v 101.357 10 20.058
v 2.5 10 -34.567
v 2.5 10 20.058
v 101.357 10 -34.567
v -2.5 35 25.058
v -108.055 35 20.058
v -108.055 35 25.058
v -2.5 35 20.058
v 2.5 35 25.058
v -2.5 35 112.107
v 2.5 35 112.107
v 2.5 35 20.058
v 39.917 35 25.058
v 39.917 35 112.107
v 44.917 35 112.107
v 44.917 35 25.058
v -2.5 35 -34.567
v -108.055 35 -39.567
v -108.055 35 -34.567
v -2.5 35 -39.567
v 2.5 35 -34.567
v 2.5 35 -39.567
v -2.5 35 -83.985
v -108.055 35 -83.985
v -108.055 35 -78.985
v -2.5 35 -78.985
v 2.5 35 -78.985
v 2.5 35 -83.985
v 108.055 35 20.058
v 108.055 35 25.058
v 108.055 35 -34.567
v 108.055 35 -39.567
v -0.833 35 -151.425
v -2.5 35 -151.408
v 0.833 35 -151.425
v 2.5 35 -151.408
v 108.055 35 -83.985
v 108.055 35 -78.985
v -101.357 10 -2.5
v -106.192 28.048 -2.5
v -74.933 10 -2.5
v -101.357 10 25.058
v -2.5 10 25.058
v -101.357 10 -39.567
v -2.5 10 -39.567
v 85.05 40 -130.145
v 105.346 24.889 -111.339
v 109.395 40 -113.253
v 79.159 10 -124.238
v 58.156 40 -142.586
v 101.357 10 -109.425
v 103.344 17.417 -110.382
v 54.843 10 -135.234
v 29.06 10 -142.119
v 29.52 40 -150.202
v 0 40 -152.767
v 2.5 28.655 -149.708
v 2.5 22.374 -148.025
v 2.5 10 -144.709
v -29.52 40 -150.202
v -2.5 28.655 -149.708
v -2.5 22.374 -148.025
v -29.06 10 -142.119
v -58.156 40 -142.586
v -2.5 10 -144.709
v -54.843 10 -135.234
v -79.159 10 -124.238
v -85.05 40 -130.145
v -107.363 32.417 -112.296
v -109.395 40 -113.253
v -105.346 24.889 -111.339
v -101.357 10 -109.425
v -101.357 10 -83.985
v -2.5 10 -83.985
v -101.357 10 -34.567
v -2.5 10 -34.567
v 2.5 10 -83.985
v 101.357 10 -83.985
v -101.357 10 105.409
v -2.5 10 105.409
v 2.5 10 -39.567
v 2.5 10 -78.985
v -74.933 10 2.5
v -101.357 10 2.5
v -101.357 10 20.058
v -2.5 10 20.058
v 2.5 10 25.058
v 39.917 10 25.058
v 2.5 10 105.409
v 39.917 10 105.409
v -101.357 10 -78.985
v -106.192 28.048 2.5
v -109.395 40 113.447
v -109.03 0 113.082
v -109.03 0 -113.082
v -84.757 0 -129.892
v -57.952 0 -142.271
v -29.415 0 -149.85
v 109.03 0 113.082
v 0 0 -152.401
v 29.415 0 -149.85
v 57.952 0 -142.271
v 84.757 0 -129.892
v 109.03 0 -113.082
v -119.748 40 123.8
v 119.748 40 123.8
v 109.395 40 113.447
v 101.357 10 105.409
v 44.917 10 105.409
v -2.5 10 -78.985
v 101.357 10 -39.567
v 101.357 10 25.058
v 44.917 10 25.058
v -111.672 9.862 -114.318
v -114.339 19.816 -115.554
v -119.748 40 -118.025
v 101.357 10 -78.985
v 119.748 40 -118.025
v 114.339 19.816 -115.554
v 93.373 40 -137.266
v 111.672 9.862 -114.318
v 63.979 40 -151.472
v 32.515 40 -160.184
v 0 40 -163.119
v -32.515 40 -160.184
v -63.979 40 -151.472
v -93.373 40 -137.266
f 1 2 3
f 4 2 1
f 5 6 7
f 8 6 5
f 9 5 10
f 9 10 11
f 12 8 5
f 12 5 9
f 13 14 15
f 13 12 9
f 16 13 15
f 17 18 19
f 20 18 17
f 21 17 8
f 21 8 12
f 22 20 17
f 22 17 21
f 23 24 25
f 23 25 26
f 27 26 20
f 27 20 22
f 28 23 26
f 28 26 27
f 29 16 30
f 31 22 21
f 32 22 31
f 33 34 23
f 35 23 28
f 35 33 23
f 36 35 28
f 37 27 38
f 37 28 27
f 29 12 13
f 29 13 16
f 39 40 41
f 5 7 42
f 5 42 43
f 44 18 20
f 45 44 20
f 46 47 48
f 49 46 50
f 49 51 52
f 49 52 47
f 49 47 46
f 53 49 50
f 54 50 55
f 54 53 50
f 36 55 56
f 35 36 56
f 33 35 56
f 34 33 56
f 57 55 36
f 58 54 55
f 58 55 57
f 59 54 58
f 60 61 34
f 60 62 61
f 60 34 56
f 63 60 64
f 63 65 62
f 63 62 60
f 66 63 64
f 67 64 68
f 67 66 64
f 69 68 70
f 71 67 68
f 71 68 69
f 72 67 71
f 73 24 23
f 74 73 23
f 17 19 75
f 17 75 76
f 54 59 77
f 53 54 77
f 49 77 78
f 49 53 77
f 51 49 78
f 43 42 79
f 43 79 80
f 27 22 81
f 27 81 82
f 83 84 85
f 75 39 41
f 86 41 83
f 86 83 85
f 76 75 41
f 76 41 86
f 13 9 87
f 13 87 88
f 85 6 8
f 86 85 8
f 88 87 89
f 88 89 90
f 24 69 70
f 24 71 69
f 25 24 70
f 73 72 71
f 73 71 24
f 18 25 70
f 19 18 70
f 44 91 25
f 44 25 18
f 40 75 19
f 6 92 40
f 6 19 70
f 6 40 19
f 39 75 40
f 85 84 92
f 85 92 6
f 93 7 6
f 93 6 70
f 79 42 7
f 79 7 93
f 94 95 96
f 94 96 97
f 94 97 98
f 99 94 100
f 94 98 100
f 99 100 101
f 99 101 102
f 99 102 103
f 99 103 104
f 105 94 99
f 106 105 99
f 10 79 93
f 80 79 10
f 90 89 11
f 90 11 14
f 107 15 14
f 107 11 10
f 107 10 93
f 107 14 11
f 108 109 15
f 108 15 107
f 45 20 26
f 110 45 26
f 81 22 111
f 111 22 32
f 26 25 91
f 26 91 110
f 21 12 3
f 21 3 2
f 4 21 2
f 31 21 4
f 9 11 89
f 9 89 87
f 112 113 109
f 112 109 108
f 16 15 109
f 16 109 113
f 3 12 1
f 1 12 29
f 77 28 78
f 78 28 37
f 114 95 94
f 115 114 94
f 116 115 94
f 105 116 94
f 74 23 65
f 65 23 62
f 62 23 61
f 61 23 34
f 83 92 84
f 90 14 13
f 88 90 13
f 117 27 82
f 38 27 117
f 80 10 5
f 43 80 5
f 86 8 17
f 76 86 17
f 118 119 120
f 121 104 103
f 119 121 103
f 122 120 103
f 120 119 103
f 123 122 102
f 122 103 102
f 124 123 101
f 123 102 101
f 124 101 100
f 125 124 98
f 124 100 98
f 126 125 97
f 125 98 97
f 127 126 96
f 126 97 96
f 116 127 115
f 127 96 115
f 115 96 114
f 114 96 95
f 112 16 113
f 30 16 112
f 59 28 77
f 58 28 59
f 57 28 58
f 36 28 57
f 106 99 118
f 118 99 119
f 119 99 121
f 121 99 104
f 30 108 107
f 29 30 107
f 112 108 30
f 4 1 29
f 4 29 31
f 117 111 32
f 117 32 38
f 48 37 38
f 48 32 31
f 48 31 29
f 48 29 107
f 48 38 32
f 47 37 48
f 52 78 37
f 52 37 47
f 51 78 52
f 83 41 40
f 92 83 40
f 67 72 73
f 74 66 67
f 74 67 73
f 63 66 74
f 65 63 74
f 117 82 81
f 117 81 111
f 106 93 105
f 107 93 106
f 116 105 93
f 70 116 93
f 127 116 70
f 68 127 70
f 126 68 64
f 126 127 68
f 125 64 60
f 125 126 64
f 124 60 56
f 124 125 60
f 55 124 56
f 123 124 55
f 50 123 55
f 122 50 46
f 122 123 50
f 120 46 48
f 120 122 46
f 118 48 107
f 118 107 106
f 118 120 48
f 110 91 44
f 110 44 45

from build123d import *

# Parameters (mm, degrees)
BOSS_EXTRUDE1_DEPTH = 40
BOSS_EXTRUDE1_DRAFT = -15
SHELL1_T            = -10
RIB7_REACH          = 207.359
SKETCH5_WALLS_W     = 5
SKETCH5_WALLS_H     = 549.174801164
SKETCH5_WALLS_W_2   = 496.753269208
SKETCH5_WALLS_H_2   = 5
SKETCH5_WALLS_W_3   = 472.743407243
SKETCH5_WALLS_W_4   = 484.34817386
RIB8_REACH          = 207.359
SKETCH6_WALLS_W     = 5
SKETCH6_WALLS_H     = 444.331737252
RIB9_REACH          = 208.27
SKETCH7_WALL_W      = 435.628467694
SKETCH7_WALL_H      = 5


with BuildPart() as part:
    # Sketch1 → Boss-Extrude1 (with draft: the straight prism first)
    with BuildSketch(Plane(origin=(0, 0, 0), x_dir=(1, 0, 0), z_dir=(0, 1, 0))):
        with BuildLine():
            Line((-109.029856613, -113.081906669), (109.029856613, -113.081906669))
            Line((109.029856613, -113.081906669), (109.029856613, 113.081906669))
            ThreePointArc((109.029856613, 113.081906669), (0, 152.401411753), (-109.029856613, 113.081906669))
            Line((-109.029856613, 113.081906669), (-109.029856613, -113.081906669))
        make_face()
    extrude(amount=BOSS_EXTRUDE1_DEPTH)
    # Boss-Extrude1: the draft: its side faces are tilted about the plane it starts from
    boss_extrude1_sides = [part.faces().sort_by_distance(p)[0] for p in [
        (0, 20, 113.081906669),
        (109.029856613, 20, 0),
        (0, 20, -152.401411753),
        (-109.029856613, 20, 0),
    ]]
    draft(boss_extrude1_sides, Plane(origin=(0, 0, 0), x_dir=(1, 0, 0), z_dir=(0, 1, 0)), BOSS_EXTRUDE1_DRAFT)

    # Shell1
    shell1_openings = [part.faces().sort_by_distance(p)[0] for p in [
        (0, 40, -12.878837242),
    ]]
    offset(amount=SHELL1_T, openings=shell1_openings, kind=Kind.INTERSECTION)

    # Sketch5 walls → Rib7 (add, up to next)
    with BuildSketch(Plane(origin=(0, 35, 0), x_dir=(1, 0, 0), z_dir=(0, 1, 0)), mode=Mode.PRIVATE) as rib7_sk1:
        with Locations((0, 17.67893893)):
            Rectangle(SKETCH5_WALLS_W, SKETCH5_WALLS_H)
    rib7_tool1 = extrude(rib7_sk1.sketch, amount=-RIB7_REACH, mode=Mode.PRIVATE) - part.part
    # Sketch5 walls → Rib7 (add, up to next)
    with BuildSketch(Plane(origin=(0, 35, 0), x_dir=(1, 0, 0), z_dir=(0, 1, 0)), mode=Mode.PRIVATE) as rib7_sk2:
        with Locations((6.802794223, -22.557588079)):
            Rectangle(SKETCH5_WALLS_W_2, SKETCH5_WALLS_H_2)
    rib7_tool2 = extrude(rib7_sk2.sketch, amount=-RIB7_REACH, mode=Mode.PRIVATE) - part.part
    # Sketch5 walls → Rib7 (add, up to next)
    with BuildSketch(Plane(origin=(0, 35, 0), x_dir=(1, 0, 0), z_dir=(0, 1, 0)), mode=Mode.PRIVATE) as rib7_sk3:
        with Locations((2.801150562, 37.066902466)):
            Rectangle(SKETCH5_WALLS_W_3, SKETCH5_WALLS_H_2)
    rib7_tool3 = extrude(rib7_sk3.sketch, amount=-RIB7_REACH, mode=Mode.PRIVATE) - part.part
    # Sketch5 walls → Rib7 (add, up to next)
    with BuildSketch(Plane(origin=(0, 35, 0), x_dir=(1, 0, 0), z_dir=(0, 1, 0)), mode=Mode.PRIVATE) as rib7_sk4:
        with Locations((0.600246549, 81.485147101)):
            Rectangle(SKETCH5_WALLS_W_4, SKETCH5_WALLS_H_2)
    rib7_tool4 = extrude(rib7_sk4.sketch, amount=-RIB7_REACH, mode=Mode.PRIVATE) - part.part
    add(rib7_tool1.solids().sort_by_distance((0, 35, -17.67893893))[0])
    add(rib7_tool2.solids().sort_by_distance((6.802794223, 35, 22.557588079))[0])
    add(rib7_tool3.solids().sort_by_distance((2.801150563, 35, -37.066902466))[0])
    add(rib7_tool4.solids().sort_by_distance((0.600246549, 35, -81.485147101))[0])

    # Sketch6 walls → Rib8 (add, up to next)
    with BuildSketch(Plane(origin=(0, 35, 0), x_dir=(1, 0, 0), z_dir=(0, 1, 0)), mode=Mode.PRIVATE) as rib8_sk1:
        with Locations((42.417422804, -59.172627575)):
            Rectangle(SKETCH6_WALLS_W, SKETCH6_WALLS_H)
    rib8_tool1 = extrude(rib8_sk1.sketch, amount=-RIB8_REACH, mode=Mode.PRIVATE) - part.part
    add(rib8_tool1.solids().sort_by_distance((42.417422804, 35, 59.172627575))[0])

    # Sketch7 wall → Rib9 (add, up to next)
    with BuildSketch(Plane(origin=(-92.409524808, 20.0901507, 0), x_dir=(0.866025403797, -0.499999999978, 0), z_dir=(0.499999999978, 0.866025403797, 0)), mode=Mode.PRIVATE) as rib9_sk1:
        Rectangle(SKETCH7_WALL_W, SKETCH7_WALL_H)
    rib9_tool1 = extrude(rib9_sk1.sketch, amount=-RIB9_REACH, mode=Mode.PRIVATE) - part.part
    add(rib9_tool1.solids().sort_by_distance((-92.409524808, 20.0901507, 0))[0])


solid = part.part
